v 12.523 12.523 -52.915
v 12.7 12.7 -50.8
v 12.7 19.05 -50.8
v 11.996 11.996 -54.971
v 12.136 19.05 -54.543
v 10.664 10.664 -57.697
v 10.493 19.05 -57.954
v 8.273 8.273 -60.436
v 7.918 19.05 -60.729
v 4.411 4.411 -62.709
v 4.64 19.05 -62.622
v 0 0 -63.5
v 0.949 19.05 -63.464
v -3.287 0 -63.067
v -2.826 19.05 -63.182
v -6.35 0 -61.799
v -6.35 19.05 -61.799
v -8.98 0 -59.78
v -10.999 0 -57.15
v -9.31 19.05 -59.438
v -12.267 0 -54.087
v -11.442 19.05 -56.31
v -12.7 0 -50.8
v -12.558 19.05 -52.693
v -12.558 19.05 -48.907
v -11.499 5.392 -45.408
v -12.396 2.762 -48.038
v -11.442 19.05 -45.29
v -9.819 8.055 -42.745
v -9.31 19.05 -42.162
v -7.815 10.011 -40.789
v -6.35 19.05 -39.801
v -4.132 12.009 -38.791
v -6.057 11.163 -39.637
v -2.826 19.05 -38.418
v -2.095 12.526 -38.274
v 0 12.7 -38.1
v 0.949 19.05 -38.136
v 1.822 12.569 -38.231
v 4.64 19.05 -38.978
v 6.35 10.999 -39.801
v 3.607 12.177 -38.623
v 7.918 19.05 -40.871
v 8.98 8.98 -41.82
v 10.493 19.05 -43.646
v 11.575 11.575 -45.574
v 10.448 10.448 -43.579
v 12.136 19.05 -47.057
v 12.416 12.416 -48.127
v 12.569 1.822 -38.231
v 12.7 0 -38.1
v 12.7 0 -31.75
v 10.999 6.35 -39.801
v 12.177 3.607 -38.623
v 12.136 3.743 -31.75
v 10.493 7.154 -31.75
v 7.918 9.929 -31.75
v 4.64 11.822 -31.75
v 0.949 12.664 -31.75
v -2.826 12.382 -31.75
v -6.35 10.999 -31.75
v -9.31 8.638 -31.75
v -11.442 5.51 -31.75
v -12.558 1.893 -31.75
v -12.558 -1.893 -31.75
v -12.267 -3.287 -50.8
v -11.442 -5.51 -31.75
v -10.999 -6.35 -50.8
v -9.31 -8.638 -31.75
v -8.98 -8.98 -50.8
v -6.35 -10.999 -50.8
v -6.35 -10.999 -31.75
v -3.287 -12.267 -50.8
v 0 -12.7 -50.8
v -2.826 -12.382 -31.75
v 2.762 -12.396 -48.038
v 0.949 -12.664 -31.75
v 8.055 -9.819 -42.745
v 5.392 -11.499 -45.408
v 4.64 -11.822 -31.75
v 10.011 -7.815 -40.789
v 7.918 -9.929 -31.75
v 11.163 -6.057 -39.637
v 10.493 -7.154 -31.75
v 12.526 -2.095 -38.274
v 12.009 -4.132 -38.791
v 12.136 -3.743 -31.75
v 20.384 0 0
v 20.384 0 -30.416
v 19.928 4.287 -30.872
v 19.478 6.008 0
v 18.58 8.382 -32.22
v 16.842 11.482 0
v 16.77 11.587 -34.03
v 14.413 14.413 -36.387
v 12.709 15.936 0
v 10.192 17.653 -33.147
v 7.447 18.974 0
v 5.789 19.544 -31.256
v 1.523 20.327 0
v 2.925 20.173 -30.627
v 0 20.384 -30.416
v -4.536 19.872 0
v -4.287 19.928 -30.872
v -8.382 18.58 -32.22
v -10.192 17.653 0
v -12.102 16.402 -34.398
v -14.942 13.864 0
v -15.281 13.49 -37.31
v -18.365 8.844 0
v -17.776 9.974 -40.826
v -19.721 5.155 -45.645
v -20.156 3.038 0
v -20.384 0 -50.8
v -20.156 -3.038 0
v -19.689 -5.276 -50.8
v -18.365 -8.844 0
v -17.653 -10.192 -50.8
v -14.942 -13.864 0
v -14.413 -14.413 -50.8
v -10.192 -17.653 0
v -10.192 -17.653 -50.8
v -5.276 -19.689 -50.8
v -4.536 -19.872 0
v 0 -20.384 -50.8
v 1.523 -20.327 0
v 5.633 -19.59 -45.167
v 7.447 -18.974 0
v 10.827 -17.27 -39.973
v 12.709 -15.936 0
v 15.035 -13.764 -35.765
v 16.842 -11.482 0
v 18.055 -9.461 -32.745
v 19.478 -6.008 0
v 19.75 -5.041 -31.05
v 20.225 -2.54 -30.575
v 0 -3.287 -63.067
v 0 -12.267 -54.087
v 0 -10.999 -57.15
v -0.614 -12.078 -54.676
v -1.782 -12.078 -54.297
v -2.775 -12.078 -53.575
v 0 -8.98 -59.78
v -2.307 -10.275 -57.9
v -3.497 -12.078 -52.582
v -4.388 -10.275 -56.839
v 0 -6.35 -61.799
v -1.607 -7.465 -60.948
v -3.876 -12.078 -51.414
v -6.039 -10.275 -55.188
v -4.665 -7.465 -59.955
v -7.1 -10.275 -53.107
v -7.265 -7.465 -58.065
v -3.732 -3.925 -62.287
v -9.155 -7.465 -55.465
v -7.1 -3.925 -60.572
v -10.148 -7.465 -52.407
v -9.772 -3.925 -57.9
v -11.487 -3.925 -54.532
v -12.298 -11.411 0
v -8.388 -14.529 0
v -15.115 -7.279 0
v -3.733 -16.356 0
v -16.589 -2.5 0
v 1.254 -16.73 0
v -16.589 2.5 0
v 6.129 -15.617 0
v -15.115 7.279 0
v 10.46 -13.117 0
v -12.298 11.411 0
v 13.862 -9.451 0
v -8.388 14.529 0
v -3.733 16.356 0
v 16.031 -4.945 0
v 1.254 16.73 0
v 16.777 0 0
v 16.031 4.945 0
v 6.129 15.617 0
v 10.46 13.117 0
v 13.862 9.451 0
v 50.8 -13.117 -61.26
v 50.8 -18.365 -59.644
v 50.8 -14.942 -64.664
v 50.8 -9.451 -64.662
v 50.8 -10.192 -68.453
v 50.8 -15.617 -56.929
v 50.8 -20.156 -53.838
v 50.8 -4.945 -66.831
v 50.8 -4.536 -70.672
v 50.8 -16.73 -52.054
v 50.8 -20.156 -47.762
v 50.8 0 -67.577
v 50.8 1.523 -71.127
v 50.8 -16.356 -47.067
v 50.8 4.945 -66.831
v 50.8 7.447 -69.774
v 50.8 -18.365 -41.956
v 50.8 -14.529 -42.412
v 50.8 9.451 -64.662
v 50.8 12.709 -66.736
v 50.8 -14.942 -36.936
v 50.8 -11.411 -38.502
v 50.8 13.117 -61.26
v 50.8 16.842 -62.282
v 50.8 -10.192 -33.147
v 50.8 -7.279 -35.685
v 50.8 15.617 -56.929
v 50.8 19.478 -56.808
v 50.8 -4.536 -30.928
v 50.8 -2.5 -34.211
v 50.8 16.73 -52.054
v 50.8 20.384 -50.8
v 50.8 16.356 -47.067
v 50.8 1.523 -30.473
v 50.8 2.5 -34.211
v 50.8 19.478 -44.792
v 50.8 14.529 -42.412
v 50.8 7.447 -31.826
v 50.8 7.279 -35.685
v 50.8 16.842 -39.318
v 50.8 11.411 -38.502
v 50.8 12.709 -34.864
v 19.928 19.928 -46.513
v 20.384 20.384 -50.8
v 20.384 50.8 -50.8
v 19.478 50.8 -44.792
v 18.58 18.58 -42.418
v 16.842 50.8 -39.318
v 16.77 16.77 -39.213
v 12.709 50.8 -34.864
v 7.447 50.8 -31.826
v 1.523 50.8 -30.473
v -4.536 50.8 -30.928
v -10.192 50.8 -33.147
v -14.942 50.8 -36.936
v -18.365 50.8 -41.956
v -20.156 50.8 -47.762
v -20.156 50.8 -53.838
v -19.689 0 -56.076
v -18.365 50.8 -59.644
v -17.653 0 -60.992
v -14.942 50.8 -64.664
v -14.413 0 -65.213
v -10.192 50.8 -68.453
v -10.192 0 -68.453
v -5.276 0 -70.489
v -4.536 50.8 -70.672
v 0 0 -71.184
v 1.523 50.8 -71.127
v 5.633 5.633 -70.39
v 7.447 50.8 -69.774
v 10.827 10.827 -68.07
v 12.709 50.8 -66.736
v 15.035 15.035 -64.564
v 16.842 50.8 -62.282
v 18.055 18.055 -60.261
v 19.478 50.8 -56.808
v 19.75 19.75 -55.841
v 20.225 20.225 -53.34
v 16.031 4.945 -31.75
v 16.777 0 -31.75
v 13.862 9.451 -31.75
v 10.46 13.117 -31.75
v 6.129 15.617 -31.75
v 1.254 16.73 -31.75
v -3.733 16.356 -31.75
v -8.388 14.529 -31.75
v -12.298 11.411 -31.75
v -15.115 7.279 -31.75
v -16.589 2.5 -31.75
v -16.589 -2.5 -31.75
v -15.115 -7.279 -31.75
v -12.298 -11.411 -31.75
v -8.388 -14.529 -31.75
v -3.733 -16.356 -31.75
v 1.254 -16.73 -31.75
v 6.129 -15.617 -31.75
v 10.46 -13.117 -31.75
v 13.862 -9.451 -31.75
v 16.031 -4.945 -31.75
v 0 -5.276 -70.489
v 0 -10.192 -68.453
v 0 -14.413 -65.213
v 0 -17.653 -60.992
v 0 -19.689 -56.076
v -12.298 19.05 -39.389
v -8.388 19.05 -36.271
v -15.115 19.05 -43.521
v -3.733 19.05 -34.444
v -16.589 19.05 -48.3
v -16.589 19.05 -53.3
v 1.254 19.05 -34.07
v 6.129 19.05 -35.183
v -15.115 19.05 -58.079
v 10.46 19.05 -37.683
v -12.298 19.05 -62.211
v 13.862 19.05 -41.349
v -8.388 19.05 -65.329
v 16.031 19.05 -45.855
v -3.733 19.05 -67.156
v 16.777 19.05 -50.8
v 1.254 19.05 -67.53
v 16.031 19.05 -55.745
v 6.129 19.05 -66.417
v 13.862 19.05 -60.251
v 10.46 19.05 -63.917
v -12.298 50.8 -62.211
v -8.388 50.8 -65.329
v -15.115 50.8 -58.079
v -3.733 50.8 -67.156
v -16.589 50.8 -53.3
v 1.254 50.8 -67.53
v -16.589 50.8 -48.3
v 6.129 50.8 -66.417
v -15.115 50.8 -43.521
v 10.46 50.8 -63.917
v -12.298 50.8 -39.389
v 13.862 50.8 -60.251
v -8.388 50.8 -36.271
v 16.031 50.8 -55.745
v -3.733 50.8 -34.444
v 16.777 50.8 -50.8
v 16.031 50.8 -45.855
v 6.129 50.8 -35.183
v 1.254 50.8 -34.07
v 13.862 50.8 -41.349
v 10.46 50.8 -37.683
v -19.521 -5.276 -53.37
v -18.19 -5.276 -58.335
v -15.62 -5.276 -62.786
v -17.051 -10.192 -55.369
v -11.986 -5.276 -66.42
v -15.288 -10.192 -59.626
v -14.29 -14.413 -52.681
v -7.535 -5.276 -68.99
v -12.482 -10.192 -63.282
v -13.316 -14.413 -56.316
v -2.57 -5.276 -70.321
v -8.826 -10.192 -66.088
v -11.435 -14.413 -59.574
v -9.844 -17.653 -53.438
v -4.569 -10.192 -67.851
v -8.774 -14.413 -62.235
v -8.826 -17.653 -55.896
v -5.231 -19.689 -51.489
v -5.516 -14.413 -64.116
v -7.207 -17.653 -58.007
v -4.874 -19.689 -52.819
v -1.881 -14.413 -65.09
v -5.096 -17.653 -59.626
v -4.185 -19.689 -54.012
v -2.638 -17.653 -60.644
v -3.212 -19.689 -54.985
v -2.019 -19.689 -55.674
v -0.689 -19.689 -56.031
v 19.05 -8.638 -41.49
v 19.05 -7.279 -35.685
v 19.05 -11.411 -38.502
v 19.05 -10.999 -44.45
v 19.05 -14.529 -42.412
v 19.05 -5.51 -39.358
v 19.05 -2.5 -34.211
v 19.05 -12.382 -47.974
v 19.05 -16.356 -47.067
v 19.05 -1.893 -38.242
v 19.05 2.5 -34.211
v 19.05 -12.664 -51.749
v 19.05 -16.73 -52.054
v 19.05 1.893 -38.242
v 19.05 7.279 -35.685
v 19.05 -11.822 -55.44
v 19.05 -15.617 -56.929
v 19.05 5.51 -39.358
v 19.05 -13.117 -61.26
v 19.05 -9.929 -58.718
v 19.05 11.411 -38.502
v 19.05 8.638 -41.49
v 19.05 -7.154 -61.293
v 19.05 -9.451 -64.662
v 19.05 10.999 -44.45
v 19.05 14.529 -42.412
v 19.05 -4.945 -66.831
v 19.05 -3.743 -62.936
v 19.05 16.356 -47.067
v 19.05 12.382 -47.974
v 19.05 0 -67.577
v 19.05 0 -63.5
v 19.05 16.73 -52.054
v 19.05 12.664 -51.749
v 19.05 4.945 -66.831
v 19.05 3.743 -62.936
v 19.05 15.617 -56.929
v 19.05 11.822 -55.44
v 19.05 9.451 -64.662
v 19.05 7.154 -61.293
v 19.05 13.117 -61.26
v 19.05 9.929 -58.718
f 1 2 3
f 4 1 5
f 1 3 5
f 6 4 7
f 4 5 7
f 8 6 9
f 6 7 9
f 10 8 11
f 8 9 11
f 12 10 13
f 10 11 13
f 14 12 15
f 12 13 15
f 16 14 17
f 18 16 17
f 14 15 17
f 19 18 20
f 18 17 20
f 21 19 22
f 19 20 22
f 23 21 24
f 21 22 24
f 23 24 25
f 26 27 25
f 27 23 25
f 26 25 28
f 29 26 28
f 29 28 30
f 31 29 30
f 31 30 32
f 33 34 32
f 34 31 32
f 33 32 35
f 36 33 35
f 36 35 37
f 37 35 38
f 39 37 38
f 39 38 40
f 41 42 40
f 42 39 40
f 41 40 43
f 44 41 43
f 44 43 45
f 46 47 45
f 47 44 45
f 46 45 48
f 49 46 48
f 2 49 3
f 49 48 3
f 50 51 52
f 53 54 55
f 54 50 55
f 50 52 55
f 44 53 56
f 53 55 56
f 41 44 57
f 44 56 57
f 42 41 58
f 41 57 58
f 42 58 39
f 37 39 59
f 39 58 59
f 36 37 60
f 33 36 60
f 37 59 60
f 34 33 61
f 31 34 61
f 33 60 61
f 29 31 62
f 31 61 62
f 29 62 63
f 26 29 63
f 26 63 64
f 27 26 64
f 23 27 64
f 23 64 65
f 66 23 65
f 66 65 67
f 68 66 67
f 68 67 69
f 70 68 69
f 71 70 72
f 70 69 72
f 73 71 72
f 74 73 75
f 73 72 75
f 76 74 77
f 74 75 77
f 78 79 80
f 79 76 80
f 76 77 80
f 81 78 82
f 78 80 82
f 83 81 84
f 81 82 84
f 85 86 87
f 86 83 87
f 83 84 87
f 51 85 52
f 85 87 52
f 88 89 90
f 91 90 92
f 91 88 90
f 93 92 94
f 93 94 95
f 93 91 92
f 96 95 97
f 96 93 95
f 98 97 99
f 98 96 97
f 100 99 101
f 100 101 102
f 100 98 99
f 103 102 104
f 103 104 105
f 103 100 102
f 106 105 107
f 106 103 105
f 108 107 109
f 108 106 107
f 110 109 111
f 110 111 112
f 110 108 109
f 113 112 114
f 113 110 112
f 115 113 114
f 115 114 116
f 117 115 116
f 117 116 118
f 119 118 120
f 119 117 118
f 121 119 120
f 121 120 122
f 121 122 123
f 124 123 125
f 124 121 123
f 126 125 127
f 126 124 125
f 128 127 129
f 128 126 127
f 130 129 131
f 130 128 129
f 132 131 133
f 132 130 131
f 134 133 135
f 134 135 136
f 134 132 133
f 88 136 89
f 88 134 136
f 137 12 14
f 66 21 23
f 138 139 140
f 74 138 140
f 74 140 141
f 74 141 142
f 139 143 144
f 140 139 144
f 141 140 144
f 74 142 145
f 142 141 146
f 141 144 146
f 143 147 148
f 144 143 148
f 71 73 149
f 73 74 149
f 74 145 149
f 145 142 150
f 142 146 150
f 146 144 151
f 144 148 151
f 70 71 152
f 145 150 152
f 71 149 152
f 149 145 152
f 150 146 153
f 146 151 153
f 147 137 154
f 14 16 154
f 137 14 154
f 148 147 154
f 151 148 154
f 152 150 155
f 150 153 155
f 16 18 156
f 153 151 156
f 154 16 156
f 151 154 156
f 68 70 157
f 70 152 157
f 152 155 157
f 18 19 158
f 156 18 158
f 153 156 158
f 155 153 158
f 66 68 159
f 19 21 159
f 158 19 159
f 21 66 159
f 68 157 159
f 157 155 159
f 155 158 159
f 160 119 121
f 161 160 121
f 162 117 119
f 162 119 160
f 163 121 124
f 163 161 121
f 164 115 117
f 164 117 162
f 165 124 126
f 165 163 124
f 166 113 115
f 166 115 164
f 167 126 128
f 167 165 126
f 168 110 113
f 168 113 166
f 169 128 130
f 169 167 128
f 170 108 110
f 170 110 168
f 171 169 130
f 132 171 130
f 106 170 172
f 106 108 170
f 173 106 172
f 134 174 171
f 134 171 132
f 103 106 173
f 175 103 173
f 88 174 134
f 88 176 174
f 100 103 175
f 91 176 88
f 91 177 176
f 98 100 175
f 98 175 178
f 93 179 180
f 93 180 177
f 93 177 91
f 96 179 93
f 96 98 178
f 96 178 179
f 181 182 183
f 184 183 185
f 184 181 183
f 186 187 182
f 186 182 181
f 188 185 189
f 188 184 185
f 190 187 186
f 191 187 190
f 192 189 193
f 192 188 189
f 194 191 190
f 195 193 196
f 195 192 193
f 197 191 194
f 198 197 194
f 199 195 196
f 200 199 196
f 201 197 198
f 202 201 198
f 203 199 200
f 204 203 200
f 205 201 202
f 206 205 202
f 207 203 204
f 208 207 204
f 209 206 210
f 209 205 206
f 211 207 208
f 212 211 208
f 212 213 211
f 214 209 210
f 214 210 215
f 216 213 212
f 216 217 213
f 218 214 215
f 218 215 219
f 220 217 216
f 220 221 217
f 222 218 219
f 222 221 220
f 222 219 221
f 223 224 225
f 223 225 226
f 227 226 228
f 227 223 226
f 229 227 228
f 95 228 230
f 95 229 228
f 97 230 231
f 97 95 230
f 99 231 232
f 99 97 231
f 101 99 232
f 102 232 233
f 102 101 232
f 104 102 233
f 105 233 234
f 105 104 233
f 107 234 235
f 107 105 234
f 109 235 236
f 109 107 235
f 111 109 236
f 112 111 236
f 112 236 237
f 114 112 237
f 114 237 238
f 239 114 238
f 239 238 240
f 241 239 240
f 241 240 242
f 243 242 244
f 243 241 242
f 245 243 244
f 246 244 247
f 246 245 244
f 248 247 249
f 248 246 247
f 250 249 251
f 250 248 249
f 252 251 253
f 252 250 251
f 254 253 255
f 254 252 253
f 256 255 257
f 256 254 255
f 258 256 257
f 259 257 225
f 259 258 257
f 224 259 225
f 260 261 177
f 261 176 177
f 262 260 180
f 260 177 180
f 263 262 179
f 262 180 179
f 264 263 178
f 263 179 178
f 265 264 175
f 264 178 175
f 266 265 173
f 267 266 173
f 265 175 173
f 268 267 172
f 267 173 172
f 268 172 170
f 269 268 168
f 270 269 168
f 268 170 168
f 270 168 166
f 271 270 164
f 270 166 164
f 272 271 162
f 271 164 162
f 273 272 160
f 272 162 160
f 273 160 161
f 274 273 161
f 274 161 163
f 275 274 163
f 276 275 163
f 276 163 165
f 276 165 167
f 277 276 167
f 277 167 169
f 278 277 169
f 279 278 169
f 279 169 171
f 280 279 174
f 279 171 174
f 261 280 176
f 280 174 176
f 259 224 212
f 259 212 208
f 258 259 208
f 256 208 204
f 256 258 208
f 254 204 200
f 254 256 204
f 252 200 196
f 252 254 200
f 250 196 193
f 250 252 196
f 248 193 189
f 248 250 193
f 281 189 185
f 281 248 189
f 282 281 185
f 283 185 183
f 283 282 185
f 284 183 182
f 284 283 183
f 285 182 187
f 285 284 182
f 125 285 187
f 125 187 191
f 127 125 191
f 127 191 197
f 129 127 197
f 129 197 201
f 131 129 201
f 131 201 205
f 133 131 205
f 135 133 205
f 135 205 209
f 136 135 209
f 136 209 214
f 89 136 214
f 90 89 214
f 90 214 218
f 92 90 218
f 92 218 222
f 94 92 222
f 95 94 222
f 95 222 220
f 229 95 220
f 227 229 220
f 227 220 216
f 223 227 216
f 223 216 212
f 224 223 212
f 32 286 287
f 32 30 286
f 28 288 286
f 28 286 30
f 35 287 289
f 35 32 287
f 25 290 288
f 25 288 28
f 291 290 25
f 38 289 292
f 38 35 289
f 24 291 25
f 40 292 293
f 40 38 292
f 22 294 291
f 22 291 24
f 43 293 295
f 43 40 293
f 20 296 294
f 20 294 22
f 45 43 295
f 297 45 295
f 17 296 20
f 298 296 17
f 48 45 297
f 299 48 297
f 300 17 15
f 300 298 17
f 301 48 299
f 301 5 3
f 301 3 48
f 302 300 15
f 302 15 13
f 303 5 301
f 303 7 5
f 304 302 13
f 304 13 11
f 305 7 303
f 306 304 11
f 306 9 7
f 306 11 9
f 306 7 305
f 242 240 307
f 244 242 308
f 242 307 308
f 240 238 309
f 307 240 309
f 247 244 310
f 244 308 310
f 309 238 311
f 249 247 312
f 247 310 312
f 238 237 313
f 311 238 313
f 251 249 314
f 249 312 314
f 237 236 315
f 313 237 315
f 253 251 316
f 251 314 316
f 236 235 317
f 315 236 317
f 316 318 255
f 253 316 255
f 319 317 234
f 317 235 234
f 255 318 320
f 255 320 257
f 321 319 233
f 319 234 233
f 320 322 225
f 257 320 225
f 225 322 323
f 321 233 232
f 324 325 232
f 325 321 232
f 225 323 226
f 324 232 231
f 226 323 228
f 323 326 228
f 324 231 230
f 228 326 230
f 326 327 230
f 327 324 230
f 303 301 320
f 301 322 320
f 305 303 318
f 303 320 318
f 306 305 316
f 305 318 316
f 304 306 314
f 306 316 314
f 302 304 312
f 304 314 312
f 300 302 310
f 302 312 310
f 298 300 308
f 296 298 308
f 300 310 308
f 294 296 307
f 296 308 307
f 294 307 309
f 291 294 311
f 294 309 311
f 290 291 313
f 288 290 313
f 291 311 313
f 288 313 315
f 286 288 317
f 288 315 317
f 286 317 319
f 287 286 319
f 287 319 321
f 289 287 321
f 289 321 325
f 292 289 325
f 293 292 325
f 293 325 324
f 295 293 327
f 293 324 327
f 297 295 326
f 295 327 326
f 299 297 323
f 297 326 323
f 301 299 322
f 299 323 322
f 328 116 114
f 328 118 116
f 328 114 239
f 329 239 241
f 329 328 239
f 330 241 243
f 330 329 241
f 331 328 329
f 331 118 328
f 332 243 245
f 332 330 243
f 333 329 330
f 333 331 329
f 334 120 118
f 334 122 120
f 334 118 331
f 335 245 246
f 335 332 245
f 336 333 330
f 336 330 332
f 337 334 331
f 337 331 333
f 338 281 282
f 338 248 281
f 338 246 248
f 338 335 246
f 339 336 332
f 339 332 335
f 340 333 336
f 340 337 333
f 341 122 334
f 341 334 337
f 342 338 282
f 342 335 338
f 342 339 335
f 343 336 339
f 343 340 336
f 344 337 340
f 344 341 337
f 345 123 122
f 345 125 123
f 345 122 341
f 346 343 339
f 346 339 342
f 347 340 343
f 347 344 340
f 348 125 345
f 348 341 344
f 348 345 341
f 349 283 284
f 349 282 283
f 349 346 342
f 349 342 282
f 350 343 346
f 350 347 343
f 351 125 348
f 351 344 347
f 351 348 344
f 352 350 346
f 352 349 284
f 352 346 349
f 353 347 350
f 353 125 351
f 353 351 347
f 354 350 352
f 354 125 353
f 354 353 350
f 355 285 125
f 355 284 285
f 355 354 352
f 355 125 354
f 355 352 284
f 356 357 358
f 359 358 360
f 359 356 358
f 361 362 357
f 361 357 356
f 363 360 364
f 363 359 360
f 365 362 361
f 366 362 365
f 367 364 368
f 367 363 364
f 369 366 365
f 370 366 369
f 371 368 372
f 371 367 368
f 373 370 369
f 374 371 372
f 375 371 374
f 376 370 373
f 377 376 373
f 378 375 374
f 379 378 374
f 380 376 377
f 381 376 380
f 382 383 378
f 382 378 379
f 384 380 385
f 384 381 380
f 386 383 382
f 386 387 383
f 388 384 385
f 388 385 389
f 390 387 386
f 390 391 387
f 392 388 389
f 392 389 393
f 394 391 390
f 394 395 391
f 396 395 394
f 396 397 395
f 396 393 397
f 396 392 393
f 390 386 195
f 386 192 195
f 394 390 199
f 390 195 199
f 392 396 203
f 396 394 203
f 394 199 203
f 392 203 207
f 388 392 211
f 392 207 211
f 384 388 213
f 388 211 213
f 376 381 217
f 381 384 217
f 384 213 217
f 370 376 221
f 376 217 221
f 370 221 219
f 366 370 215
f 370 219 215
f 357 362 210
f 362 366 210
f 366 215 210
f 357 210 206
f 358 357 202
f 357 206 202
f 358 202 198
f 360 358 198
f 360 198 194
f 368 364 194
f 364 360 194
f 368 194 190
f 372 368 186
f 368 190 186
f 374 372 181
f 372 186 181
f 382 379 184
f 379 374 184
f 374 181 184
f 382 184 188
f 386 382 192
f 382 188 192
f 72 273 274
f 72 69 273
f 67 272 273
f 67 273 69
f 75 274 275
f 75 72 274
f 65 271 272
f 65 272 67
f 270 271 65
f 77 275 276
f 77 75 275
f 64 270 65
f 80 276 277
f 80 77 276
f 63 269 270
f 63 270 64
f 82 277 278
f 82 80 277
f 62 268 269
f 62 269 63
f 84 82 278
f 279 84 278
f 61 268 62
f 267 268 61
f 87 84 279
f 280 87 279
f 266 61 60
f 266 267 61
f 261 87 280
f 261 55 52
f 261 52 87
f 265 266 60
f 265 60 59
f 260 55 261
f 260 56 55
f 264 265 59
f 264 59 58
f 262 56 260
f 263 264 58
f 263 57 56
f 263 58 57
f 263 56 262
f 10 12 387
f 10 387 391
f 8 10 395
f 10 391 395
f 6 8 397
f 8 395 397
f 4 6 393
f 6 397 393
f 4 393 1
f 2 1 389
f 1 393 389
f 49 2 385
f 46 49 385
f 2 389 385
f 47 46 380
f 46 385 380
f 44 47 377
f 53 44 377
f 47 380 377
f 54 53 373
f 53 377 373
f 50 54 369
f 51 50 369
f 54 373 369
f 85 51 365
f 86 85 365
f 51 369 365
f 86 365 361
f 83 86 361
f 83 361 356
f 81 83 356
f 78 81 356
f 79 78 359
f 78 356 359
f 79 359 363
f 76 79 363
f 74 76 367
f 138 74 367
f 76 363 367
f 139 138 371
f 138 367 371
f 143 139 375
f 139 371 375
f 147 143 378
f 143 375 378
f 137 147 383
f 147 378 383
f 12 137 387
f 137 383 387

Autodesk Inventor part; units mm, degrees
ref_plane "YZ Plane" through (0, 0, 0) normal (1, 0, 0) x (0, 1, 0)
sketch "Sketch18" plane through (0, 0, 0) normal (0, 0, 1) x (1, 0, 0)
  circle A0 centre (0, 0) radius 20.3835
  dimension "d50" = 40.767
extrude "Extrusion10" add sketch "Sketch18" against normal blind 50.8
sketch "Sketch24" plane through (0, 0, 0) normal (0, 0, 1) x (1, 0, 0)
  line L0 (0, 0) -> (20.3835, 0)
  circle A0 centre (0, 0) radius 20.3835 projected
  line L1 (0, 0) -> (0, 20.3835)
ref_plane "Work Plane16" through (0, 0, 0) normal (1, 0, 0) x (0, 1, 0)
ref_plane "Work Plane17" through (0, 0, 0) normal (0, -1, 0) x (1, 0, 0)
sketch "Sketch25" plane through (0, 0, 0) normal (1, 0, 0) x (0, 1, 0)
  line L0 (-20.3835, -50.8) -> (20.3835, -50.8) projected
  circle A0 centre (0, -50.8) radius 20.3835
  point P0 (0, 0)
  dimension "d67" = 40.767
sketch "Sketch26" plane through (0, 0, 0) normal (0, -1, 0) x (1, 0, 0)
  line L0 (-20.3835, -50.8) -> (20.3835, -50.8) projected
  circle A0 centre (0, -50.8) radius 20.3835
  point P0 (0, 0)
extrude "Extrusion14" add sketch "Sketch26" against normal blind 50.8
extrude "Extrusion15" add sketch "Sketch25" along normal blind 50.8
sketch "Sketch27" plane through (0, 0, 0) normal (-1, 0, 0) x (0, 0, 1)
  line L0 (-50.8, 0) -> (-50.8, -20.3835) projected
  line L1 (-50.8, 0) -> (-50.8, -20.3835)
  circle A0 centre (-50.8, 0) radius 20.3835 projected
  line L2 (-50.8, 0) -> (-71.1835, 0) projected
  line L3 (-50.8, 0) -> (-71.1835, 0)
  arc A1 (-71.1835, 0) -> (-50.8, -20.3835) centre (-50.8, 0) ccw
  point P0 (0, 0)
revolve "Revolution12" add sketch "Sketch27" angle 90 about axis through (0, 0, -50.8) along (0, 1, 0) picked at (-52.3119, -13.4186) contours L0 A0 L2
sketch "Sketch28" plane through (0, 0, 0) normal (0, 0, 1) x (1, 0, 0)
  line L0 (20.3835, 20.3835) -> (0, 0) projected
  circle A0 centre (0, 0) radius 12.7
  line L1 (0, 0) -> (0, -20.3835) projected
  circle A1 centre (0, 0) radius 16.7767
  point P0 (14.4133, 14.4133)
  dimension "d73" = 25.4
  dimension "d74" = 33.5534
sketch "Sketch29" plane through (0, 50.8, -50.8) normal (0, 1, 0) x (1, 0, 0)
  line L0 (0, 20.3835) -> (0, 0) projected
  circle A0 centre (0, 0) radius 12.7
  line L1 (0, 0) -> (-20.3835, 0) projected
  circle A1 centre (0, 0) radius 16.7767
  point P0 (0, -50.8)
  dimension "d75" = 25.4
  dimension "d76" = 33.5534
sketch "Sketch30" plane through (50.8, 0, -50.8) normal (1, 0, 0) x (0, 0, -1)
  circle A0 centre (0, 0) radius 20.3835 projected
  circle A1 centre (0, 0) radius 12.7
  line L0 (-20.3835, 20.3835) -> (0, 0) projected
  circle A2 centre (0, 0) radius 16.7767
  point P0 (-50.8, 0)
  point P1 (-14.4133, 14.4133)
  dimension "d77" = 25.4
  dimension "d78" = 33.5534
extrude "Extrusion16" cut sketch "Sketch30" against normal blind 50.8 contours A1
extrude "Extrusion17" cut sketch "Sketch28" against normal blind 50.8 contours A0 L1 L0 | L0 L1 A0
extrude "Extrusion18" cut sketch "Sketch29" against normal blind 50.8 contours A0 L1 L0 | L0 L1 A0
extrude "Extrusion19" cut sketch "Sketch30" against normal blind 31.75 contours A2
extrude "Extrusion20" cut sketch "Sketch28" against normal blind 31.75 contours A1 L1 A0 L0 | L0 A0 L1 A1
extrude "Extrusion21" cut sketch "Sketch29" against normal blind 31.75 contours A1 L1 A0 L0 | L0 A0 L1 A1
sketch "Sketch31" plane through (0, 0, -50.8) normal (1, 0, 0) x (0, 0, -1)
  line L0 (12.7, 0) -> (0, 0) projected
  line L1 (0, 0) -> (0, -12.7) projected
  arc A0 (0, -12.7) -> (12.7, 0) centre (0, 0) ccw projected
  point P0 (-50.8, 0)
revolve "Revolution13" cut sketch "Sketch31" angle 90 about axis through (0, 0, -50.8) along (0, 1, 0)
properties part number "3-way 90 1 Inch"
